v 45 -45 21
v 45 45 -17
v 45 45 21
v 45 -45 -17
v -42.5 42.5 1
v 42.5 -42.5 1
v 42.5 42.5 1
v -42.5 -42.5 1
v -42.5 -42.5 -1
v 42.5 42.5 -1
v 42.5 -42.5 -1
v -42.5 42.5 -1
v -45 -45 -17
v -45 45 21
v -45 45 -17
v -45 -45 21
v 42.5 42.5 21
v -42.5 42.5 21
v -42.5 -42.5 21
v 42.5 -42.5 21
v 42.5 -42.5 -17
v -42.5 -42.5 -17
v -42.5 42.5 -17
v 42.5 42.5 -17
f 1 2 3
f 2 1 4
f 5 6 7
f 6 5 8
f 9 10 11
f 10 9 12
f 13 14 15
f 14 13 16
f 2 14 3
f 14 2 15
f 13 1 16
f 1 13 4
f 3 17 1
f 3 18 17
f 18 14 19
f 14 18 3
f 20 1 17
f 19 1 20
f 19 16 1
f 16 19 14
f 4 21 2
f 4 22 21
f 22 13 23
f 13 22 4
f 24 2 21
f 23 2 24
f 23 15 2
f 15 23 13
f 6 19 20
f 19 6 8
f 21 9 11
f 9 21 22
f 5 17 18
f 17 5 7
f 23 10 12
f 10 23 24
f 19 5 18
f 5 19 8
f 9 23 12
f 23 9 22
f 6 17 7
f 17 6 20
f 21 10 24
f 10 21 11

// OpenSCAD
// Dimensions for DIY Magnetic Stirrer Housing (80mm PC Fan)
// Units: millimetres

// Overall outer dimensions
outer_width = 90;
outer_height = 90;
box_height = 40;

// Wall and top plate thicknesses
wall_thickness = 2.5;
top_thickness = 2;

// Screw hole pattern
screw_hole_dia = 4.5;
screw_pattern_size = 71.5;

// Cable notch dimensions
notch_width = 12;
notch_depth = 8; // From top edge (z=40) down

// Print orientation: Top plate on bed (z=0 to 2), walls rise to z=40
// Centered on origin (X, Y)

// Calculate inner dimensions (for reference)
inner_width = outer_width - 2 * wall_thickness;
inner_height = outer_height - 2 * wall_thickness;

// Calculate screw hole positions (centered on 71.5mm square)
screw_offset = screw_pattern_size / 2;

// Define the main box structure
module stirrer_housing() {
    // Base plate (top of the physical part, on the bed)
    // 90x90x2mm, centered at origin, z=0 to z=2
    cube([outer_width, outer_height, top_thickness], center = true);

    // Four walls rising from the base
    // Wall thickness is 2.5mm, height is 38mm (from z=2 to z=40)
    // Walls are centered at origin, so they extend from -45 to +45 in X/Y
    
    // Front wall (Y negative side)
    // Centered at (0, -45, 21) -> Y range: -45 - 1.25 to -45 + 1.25? No.
    // Wall is 2.5 thick. Centered at Y = -45 + 1.25 = -43.75?
    // Let's use translate to position the center of the wall.
    // Wall Y center = -outer_height/2 + wall_thickness/2 = -45 + 1.25 = -43.75
    translate([0, -outer_height/2 + wall_thickness/2, 2])
        cube([outer_width, wall_thickness, box_height - top_thickness], center = true);
        
    // Back wall (Y positive side)
    // Center Y = 45 - 1.25 = 43.75
    translate([0, outer_height/2 - wall_thickness/2, 2])
        cube([outer_width, wall_thickness, box_height - top_thickness], center = true);
        
    // Left wall (X negative side)
    // Center X = -45 + 1.25 = -43.75
    translate([-outer_width/2 + wall_thickness/2, 0, 2])
        cube([wall_thickness, outer_height, box_height - top_thickness], center = true);
        
    // Right wall (X positive side)
    // Center X = 45 - 1.25 = 43.75
    translate([outer_width/2 - wall_thickness/2, 0, 2])
        cube([wall_thickness, outer_height, box_height - top_thickness], center = true);
}

// Define the screw holes
module screw_holes() {
    for (x = [-1, 1]) {
        for (y = [-1, 1]) {
            translate([x * screw_offset, y * screw_offset, 0])
                cylinder(h = box_height, d = screw_hole_dia, $fn = 64);
        }
    }
}

// Define the cable notch
module cable_notch() {
    // Notch is in one wall. Let's pick the front wall (Y negative side).
    // It is centered along the wall (X=0).
    // It reaches 8mm down from the open edge (z=40). So z goes from 32 to 40.
    // Width is 12mm.
    // We need to cut this out of the wall.
    // The wall is at Y = -45 (outer edge).
    // We create a cutter that extends slightly past the wall thickness to ensure clean cut.
    
    // Cutter dimensions:
    // X: -6 to +6 (width 12)
    // Y: -45 - 1 (to cut through the wall) to -45 + 1 (to cut through)
    // Z: 32 to 40 (plus a bit to ensure cut)
    
    translate([0, -outer_height/2 - 1, 32])
        cube([notch_width + 0.02, 2, notch_depth + 0.02], center = false);
}

// Main assembly
union() {
    // Create the solid box
    stirrer_housing();
    
    // Cut the screw holes
    difference() {
        stirrer_housing();
        screw_holes();
    }
    
    // Cut the cable notch
    difference() {
        stirrer_housing();
        cable_notch();
    }
}
